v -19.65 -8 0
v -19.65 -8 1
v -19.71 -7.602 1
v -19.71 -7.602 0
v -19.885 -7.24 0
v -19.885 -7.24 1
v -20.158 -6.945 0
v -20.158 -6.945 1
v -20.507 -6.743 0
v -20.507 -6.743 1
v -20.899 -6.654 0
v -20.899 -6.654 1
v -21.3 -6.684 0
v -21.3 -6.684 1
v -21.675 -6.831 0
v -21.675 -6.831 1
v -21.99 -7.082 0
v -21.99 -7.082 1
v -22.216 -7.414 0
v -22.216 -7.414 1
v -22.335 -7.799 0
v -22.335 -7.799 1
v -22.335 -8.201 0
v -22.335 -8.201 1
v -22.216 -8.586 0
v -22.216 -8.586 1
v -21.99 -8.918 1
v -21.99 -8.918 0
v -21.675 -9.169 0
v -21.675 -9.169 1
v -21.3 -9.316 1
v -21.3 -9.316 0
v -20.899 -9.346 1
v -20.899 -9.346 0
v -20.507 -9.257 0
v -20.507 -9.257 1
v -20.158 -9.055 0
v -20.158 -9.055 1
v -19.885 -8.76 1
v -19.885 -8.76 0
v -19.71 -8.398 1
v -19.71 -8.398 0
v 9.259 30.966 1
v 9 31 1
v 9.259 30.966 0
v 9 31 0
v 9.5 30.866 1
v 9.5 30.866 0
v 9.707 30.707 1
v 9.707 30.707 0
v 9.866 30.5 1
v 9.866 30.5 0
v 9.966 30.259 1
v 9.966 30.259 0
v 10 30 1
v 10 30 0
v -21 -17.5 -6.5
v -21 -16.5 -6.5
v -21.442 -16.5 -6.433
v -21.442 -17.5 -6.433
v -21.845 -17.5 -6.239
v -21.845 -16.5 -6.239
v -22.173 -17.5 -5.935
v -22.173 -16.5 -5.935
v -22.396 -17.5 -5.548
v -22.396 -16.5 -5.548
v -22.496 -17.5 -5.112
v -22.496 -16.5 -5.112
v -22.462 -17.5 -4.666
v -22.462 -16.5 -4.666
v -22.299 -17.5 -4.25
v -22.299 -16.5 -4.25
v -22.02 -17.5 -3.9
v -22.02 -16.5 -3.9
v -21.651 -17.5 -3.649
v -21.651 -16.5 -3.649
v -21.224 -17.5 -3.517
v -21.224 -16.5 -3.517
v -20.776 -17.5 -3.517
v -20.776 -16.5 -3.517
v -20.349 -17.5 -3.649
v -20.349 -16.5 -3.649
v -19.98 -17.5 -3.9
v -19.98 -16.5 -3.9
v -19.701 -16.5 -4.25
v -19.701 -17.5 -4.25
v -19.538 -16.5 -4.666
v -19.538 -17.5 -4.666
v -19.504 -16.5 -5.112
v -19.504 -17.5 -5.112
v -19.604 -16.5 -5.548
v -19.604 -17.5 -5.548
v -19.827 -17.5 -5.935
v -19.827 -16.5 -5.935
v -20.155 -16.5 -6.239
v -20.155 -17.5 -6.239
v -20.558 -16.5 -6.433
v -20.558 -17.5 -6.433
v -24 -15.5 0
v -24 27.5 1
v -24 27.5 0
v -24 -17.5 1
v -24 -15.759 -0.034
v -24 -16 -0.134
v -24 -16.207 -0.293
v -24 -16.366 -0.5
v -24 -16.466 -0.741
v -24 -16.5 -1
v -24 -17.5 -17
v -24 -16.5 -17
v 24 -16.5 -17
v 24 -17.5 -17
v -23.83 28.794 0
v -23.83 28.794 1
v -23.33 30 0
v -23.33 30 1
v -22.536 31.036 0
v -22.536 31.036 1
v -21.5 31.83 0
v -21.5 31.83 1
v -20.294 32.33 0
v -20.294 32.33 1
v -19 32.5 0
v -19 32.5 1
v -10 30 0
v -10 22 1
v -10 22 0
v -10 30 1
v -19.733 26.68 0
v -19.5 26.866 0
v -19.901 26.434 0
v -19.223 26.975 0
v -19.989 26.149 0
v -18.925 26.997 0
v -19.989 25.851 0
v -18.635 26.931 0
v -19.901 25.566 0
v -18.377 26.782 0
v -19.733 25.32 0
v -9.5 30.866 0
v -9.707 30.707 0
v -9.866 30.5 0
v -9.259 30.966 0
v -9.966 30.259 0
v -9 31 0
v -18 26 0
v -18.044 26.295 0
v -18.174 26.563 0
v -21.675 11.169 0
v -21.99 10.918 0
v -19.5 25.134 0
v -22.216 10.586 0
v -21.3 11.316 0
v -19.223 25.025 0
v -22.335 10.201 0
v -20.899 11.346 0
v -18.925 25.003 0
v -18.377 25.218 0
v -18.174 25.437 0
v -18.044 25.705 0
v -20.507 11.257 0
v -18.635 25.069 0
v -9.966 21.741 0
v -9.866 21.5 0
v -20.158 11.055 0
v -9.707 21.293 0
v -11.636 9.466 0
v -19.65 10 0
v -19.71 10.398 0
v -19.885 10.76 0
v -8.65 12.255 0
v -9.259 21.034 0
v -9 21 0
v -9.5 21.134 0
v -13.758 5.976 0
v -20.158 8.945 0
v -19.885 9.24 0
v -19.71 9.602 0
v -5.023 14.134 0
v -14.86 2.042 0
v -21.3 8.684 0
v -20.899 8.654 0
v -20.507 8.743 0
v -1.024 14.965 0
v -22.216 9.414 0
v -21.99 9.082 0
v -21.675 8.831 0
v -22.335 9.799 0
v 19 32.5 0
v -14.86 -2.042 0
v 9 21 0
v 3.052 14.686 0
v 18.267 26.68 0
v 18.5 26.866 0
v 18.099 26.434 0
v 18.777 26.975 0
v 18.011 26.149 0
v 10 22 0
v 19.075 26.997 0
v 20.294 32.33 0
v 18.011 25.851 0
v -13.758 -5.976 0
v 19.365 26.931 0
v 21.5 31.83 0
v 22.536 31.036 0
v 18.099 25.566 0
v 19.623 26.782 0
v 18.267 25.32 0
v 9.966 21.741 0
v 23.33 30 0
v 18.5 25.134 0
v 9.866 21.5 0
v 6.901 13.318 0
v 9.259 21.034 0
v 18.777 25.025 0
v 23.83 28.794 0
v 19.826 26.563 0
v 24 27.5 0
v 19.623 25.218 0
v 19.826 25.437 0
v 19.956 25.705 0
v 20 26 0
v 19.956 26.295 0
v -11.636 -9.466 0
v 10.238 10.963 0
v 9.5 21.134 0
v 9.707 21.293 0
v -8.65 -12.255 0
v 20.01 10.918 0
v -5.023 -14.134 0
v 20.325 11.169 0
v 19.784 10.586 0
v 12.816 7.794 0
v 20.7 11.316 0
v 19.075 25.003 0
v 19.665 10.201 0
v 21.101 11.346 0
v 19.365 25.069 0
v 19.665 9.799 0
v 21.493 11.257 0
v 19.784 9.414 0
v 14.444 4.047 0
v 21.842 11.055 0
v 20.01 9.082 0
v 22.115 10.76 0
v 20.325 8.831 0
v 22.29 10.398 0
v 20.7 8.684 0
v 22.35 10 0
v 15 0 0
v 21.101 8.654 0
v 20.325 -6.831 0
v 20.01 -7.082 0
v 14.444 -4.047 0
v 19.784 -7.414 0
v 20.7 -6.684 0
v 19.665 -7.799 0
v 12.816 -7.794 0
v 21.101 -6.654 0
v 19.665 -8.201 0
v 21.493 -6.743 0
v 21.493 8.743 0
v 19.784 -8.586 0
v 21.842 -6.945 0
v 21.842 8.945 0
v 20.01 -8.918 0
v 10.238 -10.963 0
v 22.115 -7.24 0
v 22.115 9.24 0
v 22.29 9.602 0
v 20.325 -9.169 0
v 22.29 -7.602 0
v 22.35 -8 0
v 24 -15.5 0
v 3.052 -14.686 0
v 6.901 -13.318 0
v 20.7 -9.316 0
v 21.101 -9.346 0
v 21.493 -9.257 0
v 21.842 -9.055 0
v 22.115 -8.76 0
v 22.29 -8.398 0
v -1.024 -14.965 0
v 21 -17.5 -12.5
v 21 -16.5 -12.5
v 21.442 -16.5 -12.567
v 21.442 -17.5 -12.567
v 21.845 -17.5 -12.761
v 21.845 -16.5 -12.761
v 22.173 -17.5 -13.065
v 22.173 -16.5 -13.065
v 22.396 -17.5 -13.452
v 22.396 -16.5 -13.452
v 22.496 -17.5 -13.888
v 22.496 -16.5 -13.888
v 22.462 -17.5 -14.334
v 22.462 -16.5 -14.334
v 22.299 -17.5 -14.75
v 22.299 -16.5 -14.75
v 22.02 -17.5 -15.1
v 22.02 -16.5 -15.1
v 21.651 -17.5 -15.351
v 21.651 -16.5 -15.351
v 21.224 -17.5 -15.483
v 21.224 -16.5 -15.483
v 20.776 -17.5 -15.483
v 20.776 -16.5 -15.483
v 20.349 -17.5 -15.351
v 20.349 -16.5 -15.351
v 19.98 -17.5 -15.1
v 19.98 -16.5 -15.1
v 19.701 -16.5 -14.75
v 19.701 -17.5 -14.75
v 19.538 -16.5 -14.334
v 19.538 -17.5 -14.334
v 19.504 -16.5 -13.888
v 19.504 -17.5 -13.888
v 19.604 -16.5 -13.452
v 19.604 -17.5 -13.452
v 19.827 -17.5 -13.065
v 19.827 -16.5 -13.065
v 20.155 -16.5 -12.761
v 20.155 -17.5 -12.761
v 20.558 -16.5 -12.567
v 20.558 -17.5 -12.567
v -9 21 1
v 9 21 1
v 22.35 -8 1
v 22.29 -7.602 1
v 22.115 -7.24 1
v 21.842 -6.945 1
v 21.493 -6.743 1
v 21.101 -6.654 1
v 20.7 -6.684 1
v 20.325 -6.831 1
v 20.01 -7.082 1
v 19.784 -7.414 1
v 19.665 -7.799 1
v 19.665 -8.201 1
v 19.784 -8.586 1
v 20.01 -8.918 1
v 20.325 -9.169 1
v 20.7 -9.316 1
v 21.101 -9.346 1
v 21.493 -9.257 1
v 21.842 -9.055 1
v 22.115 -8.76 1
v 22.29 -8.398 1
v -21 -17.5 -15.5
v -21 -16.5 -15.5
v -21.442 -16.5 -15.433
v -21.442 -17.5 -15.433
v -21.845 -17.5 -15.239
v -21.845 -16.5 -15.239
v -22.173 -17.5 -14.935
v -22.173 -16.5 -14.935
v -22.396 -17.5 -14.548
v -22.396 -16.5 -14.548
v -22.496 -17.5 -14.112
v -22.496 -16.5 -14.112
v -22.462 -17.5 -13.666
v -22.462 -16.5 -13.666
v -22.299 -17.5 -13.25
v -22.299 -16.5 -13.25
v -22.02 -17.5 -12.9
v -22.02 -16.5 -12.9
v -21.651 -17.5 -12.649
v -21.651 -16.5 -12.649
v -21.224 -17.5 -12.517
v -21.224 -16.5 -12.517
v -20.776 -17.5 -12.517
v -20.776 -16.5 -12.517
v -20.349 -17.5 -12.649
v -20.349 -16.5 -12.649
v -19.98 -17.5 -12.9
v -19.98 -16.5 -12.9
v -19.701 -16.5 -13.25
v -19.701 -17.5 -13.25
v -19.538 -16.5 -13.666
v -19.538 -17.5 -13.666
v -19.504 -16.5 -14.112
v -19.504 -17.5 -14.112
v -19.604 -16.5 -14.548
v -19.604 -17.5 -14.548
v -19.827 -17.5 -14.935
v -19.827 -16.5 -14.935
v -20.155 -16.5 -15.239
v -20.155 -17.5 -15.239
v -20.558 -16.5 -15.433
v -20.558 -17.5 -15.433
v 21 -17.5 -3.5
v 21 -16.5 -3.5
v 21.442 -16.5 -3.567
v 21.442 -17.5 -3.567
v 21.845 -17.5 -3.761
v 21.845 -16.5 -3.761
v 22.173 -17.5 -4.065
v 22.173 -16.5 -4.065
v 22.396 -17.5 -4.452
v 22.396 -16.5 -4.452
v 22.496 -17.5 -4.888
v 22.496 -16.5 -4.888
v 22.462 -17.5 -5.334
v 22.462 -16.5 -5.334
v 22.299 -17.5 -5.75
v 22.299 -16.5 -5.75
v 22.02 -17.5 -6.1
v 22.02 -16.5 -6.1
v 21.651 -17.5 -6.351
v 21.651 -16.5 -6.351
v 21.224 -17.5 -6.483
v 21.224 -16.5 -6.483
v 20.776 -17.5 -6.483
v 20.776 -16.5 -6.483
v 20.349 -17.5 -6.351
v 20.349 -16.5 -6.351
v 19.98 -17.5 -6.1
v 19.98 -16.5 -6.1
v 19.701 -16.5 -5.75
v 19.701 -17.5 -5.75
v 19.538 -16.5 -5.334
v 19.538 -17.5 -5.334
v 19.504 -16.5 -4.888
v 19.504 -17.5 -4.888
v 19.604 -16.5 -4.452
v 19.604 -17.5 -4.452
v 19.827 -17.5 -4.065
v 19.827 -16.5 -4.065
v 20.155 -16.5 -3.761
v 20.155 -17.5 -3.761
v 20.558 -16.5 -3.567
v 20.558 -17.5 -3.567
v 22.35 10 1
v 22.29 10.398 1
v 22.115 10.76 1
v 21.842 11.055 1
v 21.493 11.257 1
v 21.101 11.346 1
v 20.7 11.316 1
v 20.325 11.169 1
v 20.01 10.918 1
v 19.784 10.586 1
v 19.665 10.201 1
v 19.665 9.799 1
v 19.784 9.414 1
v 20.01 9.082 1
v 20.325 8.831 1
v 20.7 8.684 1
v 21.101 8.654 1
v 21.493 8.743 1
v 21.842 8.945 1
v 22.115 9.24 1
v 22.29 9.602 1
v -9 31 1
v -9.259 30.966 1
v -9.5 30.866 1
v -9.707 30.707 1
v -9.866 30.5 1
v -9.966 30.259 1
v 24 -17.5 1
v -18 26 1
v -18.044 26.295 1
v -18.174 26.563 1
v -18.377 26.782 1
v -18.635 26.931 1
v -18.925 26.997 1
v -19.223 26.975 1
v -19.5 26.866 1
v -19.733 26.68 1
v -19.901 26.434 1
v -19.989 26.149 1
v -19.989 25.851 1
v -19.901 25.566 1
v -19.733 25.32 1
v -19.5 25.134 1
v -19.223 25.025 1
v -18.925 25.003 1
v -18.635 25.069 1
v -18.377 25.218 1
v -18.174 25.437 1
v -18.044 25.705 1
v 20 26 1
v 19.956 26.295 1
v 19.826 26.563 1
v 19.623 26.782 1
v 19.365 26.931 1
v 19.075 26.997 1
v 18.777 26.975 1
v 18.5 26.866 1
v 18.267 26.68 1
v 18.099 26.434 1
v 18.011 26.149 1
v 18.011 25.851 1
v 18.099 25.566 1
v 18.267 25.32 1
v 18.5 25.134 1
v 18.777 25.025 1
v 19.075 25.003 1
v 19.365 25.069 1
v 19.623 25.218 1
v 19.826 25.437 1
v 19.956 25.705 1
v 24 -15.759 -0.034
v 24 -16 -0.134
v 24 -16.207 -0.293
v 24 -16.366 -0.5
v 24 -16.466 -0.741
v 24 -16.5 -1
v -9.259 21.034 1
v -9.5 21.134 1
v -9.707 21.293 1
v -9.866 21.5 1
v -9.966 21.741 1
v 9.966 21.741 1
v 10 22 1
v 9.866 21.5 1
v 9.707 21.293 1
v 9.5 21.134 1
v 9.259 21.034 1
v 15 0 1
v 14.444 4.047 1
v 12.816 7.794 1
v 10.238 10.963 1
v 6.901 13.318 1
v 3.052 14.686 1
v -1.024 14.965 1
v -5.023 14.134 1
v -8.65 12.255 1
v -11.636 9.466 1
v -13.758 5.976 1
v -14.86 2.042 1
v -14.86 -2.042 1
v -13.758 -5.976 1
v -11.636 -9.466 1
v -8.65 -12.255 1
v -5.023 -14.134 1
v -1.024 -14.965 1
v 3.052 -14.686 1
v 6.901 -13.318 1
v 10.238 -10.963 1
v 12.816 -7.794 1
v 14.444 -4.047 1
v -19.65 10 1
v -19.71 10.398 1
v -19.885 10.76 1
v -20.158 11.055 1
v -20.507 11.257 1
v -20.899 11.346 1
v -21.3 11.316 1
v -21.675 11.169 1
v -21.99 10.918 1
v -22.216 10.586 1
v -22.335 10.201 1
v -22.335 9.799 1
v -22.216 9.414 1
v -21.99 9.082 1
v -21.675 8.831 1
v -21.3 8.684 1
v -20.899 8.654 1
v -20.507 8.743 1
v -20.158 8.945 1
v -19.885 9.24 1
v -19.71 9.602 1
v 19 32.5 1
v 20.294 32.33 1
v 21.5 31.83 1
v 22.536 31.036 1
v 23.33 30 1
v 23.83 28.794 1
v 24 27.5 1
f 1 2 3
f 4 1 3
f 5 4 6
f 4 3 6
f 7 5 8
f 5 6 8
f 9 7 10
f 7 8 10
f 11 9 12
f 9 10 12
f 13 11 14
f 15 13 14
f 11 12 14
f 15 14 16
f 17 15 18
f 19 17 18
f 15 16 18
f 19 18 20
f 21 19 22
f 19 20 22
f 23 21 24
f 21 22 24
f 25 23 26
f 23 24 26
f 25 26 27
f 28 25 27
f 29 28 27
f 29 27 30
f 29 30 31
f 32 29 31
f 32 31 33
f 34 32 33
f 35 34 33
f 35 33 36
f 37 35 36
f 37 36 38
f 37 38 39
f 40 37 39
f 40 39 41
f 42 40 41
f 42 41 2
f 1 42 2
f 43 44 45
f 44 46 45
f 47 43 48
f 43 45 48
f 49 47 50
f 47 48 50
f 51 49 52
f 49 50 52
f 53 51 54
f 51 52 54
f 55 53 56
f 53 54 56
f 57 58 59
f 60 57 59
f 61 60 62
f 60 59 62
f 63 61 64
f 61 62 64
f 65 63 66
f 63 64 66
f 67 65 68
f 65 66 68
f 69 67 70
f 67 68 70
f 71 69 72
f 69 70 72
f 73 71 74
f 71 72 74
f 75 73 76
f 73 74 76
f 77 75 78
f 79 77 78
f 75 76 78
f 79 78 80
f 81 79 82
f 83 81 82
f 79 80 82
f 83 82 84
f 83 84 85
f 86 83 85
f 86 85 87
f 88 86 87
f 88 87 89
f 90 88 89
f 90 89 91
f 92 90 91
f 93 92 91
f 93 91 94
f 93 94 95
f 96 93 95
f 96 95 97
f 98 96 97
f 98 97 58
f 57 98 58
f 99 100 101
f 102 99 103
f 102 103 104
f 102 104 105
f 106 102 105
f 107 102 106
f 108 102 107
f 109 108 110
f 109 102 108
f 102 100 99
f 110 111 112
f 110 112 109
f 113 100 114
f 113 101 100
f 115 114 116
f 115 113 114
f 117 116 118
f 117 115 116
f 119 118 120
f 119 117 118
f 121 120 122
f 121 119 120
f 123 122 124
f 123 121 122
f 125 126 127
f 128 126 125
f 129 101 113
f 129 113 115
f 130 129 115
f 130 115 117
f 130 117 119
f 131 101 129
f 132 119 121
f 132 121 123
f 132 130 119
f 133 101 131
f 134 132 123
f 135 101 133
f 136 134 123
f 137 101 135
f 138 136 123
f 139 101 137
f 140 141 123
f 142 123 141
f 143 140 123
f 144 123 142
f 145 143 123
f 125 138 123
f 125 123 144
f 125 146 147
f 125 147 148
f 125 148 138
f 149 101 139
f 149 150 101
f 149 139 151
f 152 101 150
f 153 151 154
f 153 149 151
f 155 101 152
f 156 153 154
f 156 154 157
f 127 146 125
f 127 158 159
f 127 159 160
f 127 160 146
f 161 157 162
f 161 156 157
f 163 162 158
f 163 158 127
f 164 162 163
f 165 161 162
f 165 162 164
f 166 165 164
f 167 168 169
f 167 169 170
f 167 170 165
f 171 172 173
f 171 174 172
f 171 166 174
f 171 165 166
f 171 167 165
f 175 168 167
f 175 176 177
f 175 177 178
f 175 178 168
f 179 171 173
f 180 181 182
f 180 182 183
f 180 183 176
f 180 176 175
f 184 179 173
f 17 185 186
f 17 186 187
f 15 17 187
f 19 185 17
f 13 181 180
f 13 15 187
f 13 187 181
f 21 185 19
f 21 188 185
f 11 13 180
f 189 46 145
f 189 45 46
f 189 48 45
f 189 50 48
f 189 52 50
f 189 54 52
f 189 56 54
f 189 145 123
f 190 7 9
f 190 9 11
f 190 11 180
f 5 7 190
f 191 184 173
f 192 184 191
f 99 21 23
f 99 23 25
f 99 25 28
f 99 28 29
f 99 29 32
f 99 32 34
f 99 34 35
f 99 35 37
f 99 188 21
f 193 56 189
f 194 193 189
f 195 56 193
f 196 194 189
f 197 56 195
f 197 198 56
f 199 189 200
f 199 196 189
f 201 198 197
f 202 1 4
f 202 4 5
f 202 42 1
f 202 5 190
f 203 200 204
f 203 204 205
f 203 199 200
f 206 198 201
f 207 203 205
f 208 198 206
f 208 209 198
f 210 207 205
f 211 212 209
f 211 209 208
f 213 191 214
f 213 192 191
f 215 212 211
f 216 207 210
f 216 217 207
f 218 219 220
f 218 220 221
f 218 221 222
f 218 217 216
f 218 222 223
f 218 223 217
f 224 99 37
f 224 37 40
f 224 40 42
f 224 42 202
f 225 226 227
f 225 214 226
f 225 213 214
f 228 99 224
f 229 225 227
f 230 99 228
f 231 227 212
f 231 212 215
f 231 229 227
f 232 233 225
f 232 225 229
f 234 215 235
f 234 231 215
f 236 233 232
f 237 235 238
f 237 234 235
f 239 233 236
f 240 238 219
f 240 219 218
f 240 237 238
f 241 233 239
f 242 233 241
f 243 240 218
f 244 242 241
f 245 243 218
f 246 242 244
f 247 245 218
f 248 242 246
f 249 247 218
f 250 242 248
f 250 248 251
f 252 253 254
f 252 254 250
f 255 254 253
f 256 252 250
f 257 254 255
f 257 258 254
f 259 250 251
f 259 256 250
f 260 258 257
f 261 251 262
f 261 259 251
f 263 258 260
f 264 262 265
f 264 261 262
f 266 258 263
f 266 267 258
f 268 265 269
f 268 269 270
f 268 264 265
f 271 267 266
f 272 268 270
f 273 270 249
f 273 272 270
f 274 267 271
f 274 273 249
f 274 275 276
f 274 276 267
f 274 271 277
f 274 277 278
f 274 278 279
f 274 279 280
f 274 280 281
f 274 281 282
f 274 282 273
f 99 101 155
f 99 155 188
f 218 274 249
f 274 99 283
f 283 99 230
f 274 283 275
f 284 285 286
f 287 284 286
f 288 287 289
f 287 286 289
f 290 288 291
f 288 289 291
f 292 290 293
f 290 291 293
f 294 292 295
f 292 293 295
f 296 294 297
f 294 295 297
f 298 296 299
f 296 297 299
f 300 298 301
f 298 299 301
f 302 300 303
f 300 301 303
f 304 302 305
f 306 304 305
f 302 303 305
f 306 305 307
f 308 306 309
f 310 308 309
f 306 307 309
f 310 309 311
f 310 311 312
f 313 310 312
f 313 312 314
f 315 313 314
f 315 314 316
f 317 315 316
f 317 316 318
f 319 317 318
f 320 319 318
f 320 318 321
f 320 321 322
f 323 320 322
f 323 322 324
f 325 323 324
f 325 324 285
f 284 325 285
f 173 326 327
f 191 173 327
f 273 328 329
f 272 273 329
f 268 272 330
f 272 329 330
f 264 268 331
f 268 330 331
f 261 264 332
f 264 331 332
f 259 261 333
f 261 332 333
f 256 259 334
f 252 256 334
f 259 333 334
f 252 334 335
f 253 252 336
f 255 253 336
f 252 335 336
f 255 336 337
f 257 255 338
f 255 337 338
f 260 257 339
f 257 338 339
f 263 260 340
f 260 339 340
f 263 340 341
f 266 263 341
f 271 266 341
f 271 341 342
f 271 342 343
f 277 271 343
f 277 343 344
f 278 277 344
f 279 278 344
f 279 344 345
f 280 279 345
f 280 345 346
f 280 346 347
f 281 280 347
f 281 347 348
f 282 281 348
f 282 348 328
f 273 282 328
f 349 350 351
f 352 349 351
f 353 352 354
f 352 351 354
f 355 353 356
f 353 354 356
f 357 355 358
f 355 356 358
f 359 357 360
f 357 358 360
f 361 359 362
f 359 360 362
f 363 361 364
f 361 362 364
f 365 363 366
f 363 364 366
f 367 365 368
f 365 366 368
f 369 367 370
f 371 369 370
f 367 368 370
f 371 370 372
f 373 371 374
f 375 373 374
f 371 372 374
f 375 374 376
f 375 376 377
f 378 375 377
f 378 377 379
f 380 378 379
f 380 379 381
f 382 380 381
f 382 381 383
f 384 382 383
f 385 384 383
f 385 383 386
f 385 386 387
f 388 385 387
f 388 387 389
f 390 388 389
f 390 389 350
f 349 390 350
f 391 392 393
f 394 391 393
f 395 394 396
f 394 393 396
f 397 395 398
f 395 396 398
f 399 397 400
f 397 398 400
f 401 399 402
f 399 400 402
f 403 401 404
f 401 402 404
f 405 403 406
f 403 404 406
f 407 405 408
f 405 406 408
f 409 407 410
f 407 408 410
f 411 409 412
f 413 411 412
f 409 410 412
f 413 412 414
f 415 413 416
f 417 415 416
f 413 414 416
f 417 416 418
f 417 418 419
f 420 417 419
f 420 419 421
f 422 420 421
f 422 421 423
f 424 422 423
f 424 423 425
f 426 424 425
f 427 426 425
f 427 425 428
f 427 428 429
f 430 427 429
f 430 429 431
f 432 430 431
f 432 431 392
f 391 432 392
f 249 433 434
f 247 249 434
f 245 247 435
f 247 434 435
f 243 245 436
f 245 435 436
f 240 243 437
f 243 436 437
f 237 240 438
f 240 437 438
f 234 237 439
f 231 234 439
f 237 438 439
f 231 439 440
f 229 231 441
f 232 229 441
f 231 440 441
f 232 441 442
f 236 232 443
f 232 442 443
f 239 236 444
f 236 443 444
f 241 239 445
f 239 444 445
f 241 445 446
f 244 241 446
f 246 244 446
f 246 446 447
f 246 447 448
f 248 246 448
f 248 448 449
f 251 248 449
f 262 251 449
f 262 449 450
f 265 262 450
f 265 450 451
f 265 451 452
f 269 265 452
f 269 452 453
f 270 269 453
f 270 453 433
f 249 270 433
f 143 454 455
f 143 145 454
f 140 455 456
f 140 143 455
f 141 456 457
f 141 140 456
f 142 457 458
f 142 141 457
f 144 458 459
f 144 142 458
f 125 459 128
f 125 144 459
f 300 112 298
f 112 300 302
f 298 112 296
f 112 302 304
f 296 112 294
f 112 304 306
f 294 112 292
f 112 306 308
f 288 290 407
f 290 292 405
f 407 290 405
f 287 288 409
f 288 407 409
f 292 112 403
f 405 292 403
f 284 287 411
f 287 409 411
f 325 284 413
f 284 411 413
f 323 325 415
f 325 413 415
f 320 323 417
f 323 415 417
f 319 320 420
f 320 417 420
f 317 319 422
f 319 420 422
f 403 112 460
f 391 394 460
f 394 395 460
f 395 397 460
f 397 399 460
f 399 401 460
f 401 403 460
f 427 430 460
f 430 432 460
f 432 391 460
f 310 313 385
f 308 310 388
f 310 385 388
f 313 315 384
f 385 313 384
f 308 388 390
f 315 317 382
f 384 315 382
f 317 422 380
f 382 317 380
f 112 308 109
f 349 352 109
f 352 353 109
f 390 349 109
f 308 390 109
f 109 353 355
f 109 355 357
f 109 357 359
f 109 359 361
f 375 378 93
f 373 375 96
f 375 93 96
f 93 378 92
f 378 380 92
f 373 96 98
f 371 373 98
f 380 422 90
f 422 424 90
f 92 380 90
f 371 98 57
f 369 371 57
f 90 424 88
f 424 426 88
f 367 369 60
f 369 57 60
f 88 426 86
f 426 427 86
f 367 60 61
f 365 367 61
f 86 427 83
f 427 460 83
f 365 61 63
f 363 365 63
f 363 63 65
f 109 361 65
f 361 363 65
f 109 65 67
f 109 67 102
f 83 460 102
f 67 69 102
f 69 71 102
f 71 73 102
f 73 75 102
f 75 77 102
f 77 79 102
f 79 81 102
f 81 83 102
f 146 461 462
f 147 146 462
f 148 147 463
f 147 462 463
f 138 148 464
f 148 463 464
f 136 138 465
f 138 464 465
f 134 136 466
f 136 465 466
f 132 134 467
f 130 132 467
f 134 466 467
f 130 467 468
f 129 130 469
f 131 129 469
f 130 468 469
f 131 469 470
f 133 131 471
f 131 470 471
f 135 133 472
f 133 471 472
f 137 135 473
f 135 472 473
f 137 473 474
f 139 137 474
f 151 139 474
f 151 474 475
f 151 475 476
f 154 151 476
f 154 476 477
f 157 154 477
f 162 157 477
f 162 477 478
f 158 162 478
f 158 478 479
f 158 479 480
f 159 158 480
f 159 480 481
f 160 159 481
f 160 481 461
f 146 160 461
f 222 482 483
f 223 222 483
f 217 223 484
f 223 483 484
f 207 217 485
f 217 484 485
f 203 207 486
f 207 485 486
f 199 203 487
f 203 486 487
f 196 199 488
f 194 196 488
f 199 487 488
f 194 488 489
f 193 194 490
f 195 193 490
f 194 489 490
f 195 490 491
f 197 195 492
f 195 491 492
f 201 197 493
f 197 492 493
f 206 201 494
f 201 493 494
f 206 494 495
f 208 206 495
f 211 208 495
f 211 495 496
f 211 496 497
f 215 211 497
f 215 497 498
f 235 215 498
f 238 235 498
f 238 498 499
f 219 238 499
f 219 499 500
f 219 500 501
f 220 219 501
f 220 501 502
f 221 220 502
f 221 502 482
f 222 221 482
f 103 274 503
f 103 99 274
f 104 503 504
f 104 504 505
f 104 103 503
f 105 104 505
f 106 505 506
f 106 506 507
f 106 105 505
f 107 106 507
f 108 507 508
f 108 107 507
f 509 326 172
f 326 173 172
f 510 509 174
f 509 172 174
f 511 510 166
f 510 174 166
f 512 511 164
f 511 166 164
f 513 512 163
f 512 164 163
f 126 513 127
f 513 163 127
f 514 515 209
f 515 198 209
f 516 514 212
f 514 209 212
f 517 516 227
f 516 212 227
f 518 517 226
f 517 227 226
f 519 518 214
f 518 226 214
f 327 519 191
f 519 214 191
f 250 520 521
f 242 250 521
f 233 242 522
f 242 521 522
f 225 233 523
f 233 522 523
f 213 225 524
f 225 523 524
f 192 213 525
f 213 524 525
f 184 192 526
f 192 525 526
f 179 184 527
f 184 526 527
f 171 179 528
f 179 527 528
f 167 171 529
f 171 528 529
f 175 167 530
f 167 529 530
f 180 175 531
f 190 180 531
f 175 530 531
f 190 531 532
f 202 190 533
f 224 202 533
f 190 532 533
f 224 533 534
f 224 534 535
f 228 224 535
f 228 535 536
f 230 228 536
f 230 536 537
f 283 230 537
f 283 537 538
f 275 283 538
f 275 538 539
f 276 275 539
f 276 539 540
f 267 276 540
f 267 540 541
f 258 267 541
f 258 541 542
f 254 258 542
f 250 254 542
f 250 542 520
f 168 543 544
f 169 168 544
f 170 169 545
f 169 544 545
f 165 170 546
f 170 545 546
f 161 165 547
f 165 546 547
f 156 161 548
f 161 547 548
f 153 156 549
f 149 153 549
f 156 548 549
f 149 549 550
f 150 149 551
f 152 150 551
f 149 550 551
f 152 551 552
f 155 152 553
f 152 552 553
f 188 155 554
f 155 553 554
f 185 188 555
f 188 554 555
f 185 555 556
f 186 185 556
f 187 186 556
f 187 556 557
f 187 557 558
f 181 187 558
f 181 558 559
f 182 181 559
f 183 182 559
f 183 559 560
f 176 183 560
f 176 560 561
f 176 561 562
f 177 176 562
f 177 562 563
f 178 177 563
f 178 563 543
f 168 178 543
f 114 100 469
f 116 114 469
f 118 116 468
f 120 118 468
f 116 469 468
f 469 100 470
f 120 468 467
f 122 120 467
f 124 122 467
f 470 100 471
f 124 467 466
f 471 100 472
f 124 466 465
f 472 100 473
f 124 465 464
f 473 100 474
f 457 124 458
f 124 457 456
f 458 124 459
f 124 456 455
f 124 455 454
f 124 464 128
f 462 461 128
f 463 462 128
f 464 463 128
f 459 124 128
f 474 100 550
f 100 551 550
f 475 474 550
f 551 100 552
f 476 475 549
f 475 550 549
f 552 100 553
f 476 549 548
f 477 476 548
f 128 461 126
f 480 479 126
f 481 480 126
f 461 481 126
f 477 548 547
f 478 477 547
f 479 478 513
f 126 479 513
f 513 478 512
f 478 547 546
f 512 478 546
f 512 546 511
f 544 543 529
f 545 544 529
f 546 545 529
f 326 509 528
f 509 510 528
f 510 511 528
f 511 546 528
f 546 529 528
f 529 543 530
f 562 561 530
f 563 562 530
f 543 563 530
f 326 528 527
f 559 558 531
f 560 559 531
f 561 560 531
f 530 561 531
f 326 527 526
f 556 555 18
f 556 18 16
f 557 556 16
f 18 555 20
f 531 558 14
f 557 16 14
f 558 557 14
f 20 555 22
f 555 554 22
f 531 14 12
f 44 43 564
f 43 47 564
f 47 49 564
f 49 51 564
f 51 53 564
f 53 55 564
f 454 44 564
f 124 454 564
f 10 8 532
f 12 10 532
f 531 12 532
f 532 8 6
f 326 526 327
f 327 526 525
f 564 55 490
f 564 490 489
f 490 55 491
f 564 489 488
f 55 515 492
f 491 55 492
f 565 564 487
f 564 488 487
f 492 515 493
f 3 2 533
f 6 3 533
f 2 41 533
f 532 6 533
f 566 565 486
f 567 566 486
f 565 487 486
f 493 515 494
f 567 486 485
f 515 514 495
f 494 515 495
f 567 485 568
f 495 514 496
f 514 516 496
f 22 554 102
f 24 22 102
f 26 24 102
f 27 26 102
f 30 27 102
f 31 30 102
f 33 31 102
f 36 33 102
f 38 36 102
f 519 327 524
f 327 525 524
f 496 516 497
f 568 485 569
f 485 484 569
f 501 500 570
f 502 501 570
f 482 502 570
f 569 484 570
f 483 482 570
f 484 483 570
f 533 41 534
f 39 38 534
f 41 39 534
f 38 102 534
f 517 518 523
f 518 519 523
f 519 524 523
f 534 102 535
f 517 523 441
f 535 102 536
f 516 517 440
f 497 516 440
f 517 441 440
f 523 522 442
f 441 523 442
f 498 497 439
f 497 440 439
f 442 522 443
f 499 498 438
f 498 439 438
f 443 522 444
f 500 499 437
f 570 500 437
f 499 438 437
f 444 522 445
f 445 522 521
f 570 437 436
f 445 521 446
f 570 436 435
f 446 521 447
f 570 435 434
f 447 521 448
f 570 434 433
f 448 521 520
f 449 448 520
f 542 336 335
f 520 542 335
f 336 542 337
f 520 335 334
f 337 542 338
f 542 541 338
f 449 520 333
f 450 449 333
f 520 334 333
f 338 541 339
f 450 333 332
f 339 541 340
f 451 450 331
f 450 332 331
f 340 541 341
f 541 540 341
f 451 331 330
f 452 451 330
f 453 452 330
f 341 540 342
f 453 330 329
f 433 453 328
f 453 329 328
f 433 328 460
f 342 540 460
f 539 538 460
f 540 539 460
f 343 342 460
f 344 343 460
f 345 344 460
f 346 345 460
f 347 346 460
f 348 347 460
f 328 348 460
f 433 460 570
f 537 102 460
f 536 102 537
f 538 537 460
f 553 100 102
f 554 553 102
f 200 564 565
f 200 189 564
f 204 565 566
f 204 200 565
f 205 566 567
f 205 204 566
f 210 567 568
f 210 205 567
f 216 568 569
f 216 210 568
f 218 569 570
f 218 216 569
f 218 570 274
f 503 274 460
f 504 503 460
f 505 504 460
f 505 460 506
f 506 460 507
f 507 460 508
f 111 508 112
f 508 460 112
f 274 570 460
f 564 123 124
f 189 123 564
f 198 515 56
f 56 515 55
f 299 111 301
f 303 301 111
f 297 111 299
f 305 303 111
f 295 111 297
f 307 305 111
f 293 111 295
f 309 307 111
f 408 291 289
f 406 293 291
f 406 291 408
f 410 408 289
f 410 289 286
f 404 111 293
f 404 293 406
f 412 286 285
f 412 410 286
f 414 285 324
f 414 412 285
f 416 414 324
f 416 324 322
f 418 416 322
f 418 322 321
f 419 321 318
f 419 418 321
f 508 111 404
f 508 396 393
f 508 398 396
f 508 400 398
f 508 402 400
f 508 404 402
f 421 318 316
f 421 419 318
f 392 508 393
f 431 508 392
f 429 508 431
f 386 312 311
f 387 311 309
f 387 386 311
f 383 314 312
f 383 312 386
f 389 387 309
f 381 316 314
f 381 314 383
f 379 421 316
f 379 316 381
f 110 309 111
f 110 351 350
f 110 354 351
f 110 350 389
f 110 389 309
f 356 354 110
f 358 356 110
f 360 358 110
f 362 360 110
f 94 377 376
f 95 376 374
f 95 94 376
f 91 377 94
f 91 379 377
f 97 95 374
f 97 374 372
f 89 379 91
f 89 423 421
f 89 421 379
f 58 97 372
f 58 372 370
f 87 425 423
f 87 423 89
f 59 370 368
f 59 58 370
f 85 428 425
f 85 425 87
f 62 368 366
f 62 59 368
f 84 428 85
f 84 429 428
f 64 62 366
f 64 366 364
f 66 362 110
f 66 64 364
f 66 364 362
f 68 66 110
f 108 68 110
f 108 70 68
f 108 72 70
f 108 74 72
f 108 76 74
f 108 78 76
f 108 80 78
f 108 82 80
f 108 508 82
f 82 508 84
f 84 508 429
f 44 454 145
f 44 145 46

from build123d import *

# Parameters (mm, degrees)
SKETCH1_W           = 48
SKETCH1_H           = 35
BOSS_EXTRUDE1_DEPTH = 1
SKETCH2_W           = 48
SKETCH2_H           = 1
BOSS_EXTRUDE2_DEPTH = 17
FILLET1_R           = 1
SKETCH3_R           = 1.35
SKETCH3_R_2         = 15
CUT_EXTRUDE1_DEPTH  = 35.731109974
SKETCH4_W           = 48
SKETCH4_H           = 1
BOSS_EXTRUDE3_DEPTH = 15
SKETCH5_R           = 1
SKETCH5_W           = 20
SKETCH5_H           = 10
CUT_EXTRUDE2_DEPTH  = 45.229515032
FILLET2_R           = 1
SKETCH6_R           = 1.5
CUT_EXTRUDE3_DEPTH  = 58.148928249
FILLET3_R           = 5


with BuildPart() as part:
    # Sketch1 → Boss-Extrude1 (new body)
    with BuildSketch(Plane.XY):
        Rectangle(SKETCH1_W, SKETCH1_H)
    extrude(amount=BOSS_EXTRUDE1_DEPTH)

    # Sketch2 → Boss-Extrude2 (add)
    with BuildSketch(Plane(origin=(0, 0, 0), x_dir=(-1, 0, 0), z_dir=(0, 0, -1))):
        with Locations((0, -17)):
            Rectangle(SKETCH2_W, SKETCH2_H)
    extrude(amount=BOSS_EXTRUDE2_DEPTH)

    # Fillet1
    fillet1_edges = [part.edges().sort_by_distance(p)[0] for p in [
        (0, -16.5, 0),
    ]]
    fillet(fillet1_edges, radius=FILLET1_R)

    # Sketch3 → Cut-Extrude1 (cut, through all)
    with BuildSketch(Plane.XY.offset(1)):
        with Locations((-21, 10)):
            Circle(SKETCH3_R)
        Circle(SKETCH3_R_2)
        with Locations((-21, -8)):
            Circle(SKETCH3_R)
        with Locations((21, -8)):
            Circle(SKETCH3_R)
        with Locations((21, 10)):
            Circle(SKETCH3_R)
    extrude(amount=-CUT_EXTRUDE1_DEPTH, mode=Mode.SUBTRACT)

    # Sketch4 → Boss-Extrude3 (add)
    with BuildSketch(Plane(origin=(0, 17.5, 0), x_dir=(1, 0, 0), z_dir=(0, 1, 0))):
        with Locations((0, -0.5)):
            Rectangle(SKETCH4_W, SKETCH4_H)
    extrude(amount=BOSS_EXTRUDE3_DEPTH)

    # Sketch5 → Cut-Extrude2 (cut, through all)
    with BuildSketch(Plane.XY.offset(1)):
        with Locations((-19, 26)):
            Circle(SKETCH5_R)
        with Locations((19, 26)):
            Circle(SKETCH5_R)
        with Locations((0, 26)):
            Rectangle(SKETCH5_W, SKETCH5_H)
    extrude(amount=-CUT_EXTRUDE2_DEPTH, mode=Mode.SUBTRACT)

    # Fillet2
    fillet2_edges = [part.edges().sort_by_distance(p)[0] for p in [
        (10, 31, 0.5),
        (10, 21, 0.5),
        (-10, 21, 0.5),
        (-10, 31, 0.5),
    ]]
    fillet(fillet2_edges, radius=FILLET2_R)

    # Sketch6 → Cut-Extrude3 (cut, through all)
    with BuildSketch(Plane(origin=(0, -16.5, 0), x_dir=(1, 0, 0), z_dir=(0, 1, 0))):
        with Locations(Location((21, 5, 0), (0, 0, 270))):
            Circle(SKETCH6_R)
        with Locations(Location((21, 14, 0), (0, 0, 270))):
            Circle(SKETCH6_R)
        with Locations(Location((-21, 5, 0), (0, 0, 90))):
            Circle(SKETCH6_R)
        with Locations(Location((-21, 14, 0), (0, 0, 90))):
            Circle(SKETCH6_R)
    extrude(amount=-CUT_EXTRUDE3_DEPTH, mode=Mode.SUBTRACT)

    # Fillet3
    fillet3_edges = [part.edges().sort_by_distance(p)[0] for p in [
        (24, 32.5, 0.5),
        (-24, 32.5, 0.5),
    ]]
    fillet(fillet3_edges, radius=FILLET3_R)


solid = part.part
